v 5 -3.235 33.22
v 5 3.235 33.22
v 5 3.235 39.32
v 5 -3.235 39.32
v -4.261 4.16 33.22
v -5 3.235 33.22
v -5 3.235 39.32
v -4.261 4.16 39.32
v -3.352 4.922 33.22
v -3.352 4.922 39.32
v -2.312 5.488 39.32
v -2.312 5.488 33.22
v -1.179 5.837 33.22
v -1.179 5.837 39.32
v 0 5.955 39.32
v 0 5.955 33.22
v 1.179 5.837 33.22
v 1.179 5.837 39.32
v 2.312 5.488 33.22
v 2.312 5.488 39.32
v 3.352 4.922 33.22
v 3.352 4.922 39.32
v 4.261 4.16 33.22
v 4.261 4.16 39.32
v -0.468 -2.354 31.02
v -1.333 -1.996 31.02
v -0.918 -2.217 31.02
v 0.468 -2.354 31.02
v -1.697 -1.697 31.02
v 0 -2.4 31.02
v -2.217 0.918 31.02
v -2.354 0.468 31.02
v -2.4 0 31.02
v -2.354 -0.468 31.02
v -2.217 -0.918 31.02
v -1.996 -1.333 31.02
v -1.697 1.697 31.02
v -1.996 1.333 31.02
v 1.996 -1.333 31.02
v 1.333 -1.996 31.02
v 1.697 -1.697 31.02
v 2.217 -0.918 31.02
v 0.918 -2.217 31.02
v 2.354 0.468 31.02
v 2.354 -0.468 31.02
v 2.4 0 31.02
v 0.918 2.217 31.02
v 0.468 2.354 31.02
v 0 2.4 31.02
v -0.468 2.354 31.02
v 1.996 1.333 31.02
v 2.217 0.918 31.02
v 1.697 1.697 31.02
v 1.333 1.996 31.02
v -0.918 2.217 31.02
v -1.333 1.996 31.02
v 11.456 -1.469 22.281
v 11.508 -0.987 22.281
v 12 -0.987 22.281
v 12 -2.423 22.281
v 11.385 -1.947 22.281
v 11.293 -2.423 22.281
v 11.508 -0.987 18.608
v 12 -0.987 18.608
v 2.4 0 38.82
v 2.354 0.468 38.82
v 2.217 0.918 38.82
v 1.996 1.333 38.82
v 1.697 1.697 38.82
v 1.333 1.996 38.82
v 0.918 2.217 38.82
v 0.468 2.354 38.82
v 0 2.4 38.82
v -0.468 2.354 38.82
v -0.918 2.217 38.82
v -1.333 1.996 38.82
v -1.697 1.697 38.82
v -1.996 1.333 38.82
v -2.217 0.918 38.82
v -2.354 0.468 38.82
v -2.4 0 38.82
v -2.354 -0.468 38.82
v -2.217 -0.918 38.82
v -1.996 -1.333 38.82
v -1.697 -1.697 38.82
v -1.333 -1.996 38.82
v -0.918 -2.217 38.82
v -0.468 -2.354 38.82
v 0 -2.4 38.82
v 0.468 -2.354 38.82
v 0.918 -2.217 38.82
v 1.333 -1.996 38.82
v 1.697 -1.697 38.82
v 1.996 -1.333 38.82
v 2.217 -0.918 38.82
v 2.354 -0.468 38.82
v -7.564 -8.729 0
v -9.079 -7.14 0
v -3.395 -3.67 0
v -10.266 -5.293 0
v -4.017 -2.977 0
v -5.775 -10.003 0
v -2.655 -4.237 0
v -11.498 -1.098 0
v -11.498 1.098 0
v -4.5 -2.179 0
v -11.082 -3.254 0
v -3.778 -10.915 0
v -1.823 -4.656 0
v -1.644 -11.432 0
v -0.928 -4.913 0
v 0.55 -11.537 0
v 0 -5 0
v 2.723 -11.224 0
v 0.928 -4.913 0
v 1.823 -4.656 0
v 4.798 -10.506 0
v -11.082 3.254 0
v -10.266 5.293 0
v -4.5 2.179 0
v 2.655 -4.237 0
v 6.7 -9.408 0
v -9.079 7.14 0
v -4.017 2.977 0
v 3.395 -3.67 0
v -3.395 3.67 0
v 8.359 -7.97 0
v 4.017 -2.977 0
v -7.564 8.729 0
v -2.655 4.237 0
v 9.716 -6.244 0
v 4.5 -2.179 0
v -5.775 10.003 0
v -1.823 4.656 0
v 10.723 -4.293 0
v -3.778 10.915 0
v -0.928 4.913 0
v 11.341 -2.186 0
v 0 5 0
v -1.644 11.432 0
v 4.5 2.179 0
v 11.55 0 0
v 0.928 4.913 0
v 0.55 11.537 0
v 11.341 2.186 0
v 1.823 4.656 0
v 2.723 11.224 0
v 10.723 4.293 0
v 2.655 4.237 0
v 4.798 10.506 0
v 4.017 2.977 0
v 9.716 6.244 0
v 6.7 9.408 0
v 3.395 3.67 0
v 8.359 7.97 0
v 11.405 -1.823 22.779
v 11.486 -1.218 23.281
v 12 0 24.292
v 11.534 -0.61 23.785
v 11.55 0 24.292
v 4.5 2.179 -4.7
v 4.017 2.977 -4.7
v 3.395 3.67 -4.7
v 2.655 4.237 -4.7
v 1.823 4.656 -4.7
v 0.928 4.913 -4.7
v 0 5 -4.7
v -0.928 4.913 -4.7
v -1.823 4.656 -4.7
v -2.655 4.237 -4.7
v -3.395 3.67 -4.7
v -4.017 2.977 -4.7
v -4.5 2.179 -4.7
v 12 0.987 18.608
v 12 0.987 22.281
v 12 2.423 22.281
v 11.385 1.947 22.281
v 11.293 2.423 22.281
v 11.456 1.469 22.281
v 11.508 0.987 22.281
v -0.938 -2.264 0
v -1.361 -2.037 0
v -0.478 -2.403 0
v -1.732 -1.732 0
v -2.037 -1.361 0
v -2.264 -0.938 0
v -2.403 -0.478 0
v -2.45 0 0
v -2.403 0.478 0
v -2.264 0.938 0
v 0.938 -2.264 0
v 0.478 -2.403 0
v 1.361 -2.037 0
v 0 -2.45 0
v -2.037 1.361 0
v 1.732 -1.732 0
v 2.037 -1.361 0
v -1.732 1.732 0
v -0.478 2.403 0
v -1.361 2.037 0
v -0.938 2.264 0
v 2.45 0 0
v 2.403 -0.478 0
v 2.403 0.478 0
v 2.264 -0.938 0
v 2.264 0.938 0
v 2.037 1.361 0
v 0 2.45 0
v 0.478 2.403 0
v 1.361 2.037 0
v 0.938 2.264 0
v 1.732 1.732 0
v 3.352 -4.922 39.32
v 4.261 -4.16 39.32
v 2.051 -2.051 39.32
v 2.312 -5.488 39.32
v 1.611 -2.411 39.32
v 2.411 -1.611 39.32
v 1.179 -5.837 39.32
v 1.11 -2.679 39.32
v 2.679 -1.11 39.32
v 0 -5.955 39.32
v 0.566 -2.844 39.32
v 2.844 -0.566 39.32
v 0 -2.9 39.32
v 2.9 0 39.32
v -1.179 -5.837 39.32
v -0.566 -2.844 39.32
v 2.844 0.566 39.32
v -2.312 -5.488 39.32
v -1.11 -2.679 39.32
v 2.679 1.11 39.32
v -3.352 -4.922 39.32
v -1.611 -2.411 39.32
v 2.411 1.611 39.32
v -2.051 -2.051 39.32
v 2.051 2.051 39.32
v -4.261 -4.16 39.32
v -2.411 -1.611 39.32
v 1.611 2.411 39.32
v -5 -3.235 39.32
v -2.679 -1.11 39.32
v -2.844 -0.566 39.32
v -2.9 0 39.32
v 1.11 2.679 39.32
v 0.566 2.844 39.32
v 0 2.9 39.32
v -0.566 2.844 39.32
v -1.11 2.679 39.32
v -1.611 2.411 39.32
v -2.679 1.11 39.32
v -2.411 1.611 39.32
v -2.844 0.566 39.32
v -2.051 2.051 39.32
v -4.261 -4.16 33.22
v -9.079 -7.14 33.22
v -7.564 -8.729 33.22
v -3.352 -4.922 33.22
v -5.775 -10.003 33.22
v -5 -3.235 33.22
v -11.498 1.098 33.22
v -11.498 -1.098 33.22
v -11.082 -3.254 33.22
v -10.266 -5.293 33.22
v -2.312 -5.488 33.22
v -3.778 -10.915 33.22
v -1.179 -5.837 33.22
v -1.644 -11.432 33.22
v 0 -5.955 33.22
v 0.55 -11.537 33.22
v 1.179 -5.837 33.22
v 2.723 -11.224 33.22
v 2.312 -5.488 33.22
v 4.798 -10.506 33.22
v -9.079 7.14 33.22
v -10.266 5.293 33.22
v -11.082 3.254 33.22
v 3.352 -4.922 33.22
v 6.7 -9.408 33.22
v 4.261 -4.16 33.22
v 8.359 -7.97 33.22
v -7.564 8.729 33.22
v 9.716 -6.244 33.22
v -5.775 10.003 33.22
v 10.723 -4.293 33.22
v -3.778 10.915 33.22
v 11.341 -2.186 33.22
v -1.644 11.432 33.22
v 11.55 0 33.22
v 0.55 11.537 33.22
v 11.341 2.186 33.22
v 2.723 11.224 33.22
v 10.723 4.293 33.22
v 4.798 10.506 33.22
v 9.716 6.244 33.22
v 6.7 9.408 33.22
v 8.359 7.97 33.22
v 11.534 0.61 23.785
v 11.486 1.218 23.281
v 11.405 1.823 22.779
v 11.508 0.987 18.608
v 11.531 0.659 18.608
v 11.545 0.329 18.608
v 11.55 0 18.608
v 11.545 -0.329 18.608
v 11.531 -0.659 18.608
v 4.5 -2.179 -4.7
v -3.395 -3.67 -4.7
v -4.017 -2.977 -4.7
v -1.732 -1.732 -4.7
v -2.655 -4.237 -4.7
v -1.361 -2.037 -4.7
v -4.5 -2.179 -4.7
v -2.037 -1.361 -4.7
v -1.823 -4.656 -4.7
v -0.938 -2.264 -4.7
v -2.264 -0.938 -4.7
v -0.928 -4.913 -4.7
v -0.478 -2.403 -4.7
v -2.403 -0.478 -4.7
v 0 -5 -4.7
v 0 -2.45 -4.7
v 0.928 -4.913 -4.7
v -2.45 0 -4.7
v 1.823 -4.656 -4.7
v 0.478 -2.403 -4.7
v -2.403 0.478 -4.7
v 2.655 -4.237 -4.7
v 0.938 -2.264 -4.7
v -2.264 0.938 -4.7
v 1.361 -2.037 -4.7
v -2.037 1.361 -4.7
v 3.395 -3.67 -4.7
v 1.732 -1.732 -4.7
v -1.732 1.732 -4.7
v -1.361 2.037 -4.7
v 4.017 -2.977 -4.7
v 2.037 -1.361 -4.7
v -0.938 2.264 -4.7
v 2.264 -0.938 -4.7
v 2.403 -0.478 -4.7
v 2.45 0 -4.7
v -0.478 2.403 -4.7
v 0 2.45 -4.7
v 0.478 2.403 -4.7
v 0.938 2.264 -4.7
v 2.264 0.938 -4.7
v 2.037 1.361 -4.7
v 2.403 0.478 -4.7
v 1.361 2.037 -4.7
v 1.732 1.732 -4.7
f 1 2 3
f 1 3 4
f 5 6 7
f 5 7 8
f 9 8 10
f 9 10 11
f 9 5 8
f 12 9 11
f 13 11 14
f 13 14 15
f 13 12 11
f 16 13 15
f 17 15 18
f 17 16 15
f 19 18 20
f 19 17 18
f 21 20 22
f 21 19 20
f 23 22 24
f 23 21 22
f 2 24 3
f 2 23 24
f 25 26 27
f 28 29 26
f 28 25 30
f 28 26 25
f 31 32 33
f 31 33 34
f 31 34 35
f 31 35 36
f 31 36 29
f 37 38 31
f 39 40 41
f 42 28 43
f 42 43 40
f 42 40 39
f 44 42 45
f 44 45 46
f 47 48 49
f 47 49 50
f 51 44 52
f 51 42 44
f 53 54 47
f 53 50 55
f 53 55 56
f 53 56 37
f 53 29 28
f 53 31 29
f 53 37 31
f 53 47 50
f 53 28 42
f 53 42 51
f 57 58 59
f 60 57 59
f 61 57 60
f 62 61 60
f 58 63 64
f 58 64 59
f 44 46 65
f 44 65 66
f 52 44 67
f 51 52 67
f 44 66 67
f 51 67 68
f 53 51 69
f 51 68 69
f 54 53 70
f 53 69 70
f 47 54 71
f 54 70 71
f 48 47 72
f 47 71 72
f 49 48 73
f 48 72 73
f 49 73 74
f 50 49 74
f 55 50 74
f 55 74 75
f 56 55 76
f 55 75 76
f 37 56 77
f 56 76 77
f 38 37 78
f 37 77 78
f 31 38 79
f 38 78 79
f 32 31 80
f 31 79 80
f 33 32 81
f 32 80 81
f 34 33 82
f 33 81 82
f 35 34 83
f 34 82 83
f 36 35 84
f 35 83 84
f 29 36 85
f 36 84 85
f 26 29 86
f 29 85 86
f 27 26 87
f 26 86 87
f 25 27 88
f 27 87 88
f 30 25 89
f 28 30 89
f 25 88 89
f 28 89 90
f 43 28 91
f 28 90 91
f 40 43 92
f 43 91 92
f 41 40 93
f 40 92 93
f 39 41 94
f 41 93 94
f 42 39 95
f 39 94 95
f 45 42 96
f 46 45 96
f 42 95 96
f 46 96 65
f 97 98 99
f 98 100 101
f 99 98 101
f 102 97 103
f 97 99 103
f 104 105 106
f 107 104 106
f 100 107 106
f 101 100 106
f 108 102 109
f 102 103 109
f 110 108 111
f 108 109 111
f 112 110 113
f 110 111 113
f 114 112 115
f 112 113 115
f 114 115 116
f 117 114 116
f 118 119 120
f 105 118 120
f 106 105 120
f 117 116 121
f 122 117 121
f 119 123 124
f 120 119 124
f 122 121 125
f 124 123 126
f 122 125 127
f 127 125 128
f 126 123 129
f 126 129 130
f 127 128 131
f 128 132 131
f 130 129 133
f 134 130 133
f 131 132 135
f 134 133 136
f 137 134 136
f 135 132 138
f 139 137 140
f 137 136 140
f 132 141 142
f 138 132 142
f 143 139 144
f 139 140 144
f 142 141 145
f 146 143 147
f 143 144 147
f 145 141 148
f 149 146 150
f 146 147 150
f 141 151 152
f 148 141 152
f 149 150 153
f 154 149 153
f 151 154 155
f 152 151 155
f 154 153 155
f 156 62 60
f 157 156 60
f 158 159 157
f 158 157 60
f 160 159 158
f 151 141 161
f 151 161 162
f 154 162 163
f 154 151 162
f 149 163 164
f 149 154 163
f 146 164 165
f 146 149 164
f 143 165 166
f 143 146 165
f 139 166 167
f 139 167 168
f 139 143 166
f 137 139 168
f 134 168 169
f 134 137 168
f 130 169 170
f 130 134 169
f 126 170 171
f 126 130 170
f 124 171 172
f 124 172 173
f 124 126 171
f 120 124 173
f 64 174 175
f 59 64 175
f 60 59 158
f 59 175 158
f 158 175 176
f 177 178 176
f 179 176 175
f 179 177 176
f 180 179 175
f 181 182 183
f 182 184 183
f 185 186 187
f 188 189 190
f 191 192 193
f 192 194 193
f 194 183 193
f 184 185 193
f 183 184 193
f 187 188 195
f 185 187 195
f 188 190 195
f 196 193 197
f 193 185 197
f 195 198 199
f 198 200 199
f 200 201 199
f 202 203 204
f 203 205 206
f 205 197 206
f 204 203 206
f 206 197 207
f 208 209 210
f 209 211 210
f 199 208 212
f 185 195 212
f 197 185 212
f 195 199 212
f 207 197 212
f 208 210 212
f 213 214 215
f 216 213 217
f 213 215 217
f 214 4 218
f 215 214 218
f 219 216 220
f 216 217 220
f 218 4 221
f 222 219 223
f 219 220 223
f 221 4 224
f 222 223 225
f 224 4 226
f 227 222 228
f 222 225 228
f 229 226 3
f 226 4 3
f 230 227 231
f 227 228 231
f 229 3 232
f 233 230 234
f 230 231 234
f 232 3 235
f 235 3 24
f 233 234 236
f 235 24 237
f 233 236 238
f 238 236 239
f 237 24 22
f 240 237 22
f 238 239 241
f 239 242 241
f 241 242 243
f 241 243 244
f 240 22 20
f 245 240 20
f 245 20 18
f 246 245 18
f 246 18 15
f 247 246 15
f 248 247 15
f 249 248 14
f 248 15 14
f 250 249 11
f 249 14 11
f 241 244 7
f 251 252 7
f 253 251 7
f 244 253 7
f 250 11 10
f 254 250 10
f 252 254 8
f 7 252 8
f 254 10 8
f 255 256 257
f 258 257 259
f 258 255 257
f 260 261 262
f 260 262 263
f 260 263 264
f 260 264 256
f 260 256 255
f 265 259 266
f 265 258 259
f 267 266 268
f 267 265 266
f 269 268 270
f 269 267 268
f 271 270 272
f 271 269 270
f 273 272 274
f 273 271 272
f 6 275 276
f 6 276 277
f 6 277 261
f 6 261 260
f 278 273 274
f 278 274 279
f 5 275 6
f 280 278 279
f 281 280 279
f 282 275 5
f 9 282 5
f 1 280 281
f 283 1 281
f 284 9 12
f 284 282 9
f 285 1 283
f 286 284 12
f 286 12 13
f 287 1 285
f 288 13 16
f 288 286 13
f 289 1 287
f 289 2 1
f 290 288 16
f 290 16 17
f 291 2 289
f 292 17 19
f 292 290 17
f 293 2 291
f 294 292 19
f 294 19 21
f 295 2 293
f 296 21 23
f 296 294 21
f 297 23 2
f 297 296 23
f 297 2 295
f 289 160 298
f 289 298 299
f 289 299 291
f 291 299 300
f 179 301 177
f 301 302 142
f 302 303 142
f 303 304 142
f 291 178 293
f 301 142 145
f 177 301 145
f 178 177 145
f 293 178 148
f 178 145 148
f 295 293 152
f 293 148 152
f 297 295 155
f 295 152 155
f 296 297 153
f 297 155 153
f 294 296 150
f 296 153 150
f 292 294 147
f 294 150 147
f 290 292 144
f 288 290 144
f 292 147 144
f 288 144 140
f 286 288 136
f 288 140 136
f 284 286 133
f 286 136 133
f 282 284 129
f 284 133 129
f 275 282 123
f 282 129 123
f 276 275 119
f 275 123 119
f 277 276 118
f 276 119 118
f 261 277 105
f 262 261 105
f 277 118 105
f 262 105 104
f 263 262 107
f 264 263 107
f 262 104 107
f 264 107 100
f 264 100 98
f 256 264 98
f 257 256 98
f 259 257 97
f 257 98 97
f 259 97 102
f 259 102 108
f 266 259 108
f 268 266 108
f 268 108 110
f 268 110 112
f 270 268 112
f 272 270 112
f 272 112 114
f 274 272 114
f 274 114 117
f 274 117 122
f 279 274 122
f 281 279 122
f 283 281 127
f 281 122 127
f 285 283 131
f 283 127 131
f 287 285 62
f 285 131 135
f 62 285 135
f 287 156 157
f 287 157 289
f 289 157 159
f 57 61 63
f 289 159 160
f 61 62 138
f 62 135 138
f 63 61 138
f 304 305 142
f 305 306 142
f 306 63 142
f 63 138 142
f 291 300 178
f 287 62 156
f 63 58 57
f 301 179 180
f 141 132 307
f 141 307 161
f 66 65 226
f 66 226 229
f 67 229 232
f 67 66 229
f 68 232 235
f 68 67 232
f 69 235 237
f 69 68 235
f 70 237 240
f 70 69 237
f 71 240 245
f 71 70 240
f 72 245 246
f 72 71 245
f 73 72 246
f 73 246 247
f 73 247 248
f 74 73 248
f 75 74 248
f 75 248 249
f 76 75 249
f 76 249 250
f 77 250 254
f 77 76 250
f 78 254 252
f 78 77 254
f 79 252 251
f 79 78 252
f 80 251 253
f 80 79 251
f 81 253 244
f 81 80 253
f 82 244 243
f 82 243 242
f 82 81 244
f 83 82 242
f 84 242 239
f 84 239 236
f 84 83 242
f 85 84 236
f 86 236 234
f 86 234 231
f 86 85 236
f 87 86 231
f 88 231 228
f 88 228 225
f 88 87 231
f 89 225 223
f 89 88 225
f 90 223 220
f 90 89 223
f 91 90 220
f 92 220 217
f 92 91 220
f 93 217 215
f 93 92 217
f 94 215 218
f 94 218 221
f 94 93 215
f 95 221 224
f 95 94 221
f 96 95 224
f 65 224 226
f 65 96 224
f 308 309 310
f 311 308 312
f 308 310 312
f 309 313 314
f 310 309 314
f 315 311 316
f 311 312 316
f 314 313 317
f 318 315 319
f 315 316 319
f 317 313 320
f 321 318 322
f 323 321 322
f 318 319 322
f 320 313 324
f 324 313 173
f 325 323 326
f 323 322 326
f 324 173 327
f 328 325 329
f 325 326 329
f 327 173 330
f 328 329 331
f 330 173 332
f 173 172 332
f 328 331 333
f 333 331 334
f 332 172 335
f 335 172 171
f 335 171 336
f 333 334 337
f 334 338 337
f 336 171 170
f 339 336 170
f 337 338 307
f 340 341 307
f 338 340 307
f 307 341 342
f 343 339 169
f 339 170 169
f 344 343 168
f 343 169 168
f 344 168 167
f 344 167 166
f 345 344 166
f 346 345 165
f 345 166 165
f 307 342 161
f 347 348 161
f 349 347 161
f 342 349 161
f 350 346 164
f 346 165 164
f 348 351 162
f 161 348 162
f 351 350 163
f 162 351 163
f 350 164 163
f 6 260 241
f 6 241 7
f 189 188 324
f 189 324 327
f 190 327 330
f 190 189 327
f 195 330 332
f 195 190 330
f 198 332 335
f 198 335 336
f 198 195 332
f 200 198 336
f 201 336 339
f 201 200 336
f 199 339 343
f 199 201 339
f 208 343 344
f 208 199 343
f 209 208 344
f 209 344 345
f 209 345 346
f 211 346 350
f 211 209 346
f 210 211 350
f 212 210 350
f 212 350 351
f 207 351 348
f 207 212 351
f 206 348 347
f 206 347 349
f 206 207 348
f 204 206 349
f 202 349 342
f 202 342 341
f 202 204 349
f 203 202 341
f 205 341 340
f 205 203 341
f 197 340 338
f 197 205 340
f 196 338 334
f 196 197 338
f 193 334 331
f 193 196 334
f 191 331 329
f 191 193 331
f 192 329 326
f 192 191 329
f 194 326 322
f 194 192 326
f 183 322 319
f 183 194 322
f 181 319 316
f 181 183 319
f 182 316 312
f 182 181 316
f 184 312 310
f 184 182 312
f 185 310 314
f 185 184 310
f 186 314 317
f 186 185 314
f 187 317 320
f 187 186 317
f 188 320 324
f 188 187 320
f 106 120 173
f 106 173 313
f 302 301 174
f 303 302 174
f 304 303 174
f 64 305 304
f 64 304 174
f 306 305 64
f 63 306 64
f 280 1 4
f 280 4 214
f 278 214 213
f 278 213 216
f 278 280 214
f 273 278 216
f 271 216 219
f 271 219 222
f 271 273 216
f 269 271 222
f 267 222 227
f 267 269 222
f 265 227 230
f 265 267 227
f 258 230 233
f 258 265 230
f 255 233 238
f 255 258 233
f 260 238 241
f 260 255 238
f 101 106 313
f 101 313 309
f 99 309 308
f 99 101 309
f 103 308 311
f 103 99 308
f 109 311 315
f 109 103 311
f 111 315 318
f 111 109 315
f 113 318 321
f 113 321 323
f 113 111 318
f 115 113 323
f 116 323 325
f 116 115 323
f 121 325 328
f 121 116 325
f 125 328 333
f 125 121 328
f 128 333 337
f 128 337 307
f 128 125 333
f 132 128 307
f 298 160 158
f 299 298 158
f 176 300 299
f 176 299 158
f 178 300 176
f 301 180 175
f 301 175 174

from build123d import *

# Parameters (mm, degrees)
SKETCH1_R           = 11.55
BOSS_EXTRUDE1_DEPTH = 33.22
BOSS_EXTRUDE2_DEPTH = 6.1
SKETCH3_R           = 2.4
CUT_EXTRUDE1_DEPTH  = 8.3
CHAMFER1_SIZE       = 0.5
SKETCH4_R           = 2.45
BOSS_EXTRUDE3_DEPTH = 4.7
BOSS_EXTRUDE4_START = 6.793009
BOSS_EXTRUDE4_DEPTH = 0.706991


with BuildPart() as part:
    # Sketch1 → Boss-Extrude1 (new body)
    with BuildSketch(Plane.XY):
        Circle(SKETCH1_R)
    extrude(amount=BOSS_EXTRUDE1_DEPTH)

    # Sketch2 → Boss-Extrude2 (add)
    with BuildSketch(Plane.XY.offset(33.22)):
        with BuildLine():
            Line((5, 3.234505372), (5, -3.234505372))
            ThreePointArc((5, -3.234505372), (0, -5.955), (-5, -3.234505372))
            Line((-5, -3.234505372), (-5, 3.234505372))
            ThreePointArc((-5, 3.234505372), (0, 5.955), (5, 3.234505372))
        make_face()
    extrude(amount=BOSS_EXTRUDE2_DEPTH)

    # Sketch3 → Cut-Extrude1 (cut)
    with BuildSketch(Plane.XY.offset(39.32)):
        Circle(SKETCH3_R)
    extrude(amount=-CUT_EXTRUDE1_DEPTH, mode=Mode.SUBTRACT)

    # Chamfer1
    chamfer1_edges = [part.edges().sort_by_distance(p)[0] for p in [
        (-2.4, 0, 39.32),
    ]]
    chamfer(chamfer1_edges, length=CHAMFER1_SIZE)

    # Sketch4 → Boss-Extrude3 (add)
    with BuildSketch(Plane(origin=(0, 0, 0), x_dir=(-1, 0, 0), z_dir=(0, 0, -1))):
        with BuildLine():
            Line((4.5, 2.179449472), (4.5, -2.179449472))
            ThreePointArc((4.5, -2.179449472), (0, -5), (-4.5, -2.179449472))
            Line((-4.5, -2.179449472), (-4.5, 2.179449472))
            ThreePointArc((-4.5, 2.179449472), (0, 5), (4.5, 2.179449472))
        make_face()
        Circle(SKETCH4_R, mode=Mode.SUBTRACT)
    extrude(amount=BOSS_EXTRUDE3_DEPTH)

    # Sketch5 → Boss-Extrude4 (add)
    with BuildSketch(Plane(origin=(4.5, 0, 0), x_dir=(0, 0, -1), z_dir=(1, 0, 0)).offset(BOSS_EXTRUDE4_START)):
        Polygon((-24.291547622, 0), (-22.281436224, 2.422902131), (-22.281436224, 0.987108276), (-18.60765225, 0.987108276), (-18.60765225, -0.987108276), (-22.281436224, -0.987108276), (-22.281436224, -2.422902131), align=None)
    extrude(amount=BOSS_EXTRUDE4_DEPTH)


solid = part.part
